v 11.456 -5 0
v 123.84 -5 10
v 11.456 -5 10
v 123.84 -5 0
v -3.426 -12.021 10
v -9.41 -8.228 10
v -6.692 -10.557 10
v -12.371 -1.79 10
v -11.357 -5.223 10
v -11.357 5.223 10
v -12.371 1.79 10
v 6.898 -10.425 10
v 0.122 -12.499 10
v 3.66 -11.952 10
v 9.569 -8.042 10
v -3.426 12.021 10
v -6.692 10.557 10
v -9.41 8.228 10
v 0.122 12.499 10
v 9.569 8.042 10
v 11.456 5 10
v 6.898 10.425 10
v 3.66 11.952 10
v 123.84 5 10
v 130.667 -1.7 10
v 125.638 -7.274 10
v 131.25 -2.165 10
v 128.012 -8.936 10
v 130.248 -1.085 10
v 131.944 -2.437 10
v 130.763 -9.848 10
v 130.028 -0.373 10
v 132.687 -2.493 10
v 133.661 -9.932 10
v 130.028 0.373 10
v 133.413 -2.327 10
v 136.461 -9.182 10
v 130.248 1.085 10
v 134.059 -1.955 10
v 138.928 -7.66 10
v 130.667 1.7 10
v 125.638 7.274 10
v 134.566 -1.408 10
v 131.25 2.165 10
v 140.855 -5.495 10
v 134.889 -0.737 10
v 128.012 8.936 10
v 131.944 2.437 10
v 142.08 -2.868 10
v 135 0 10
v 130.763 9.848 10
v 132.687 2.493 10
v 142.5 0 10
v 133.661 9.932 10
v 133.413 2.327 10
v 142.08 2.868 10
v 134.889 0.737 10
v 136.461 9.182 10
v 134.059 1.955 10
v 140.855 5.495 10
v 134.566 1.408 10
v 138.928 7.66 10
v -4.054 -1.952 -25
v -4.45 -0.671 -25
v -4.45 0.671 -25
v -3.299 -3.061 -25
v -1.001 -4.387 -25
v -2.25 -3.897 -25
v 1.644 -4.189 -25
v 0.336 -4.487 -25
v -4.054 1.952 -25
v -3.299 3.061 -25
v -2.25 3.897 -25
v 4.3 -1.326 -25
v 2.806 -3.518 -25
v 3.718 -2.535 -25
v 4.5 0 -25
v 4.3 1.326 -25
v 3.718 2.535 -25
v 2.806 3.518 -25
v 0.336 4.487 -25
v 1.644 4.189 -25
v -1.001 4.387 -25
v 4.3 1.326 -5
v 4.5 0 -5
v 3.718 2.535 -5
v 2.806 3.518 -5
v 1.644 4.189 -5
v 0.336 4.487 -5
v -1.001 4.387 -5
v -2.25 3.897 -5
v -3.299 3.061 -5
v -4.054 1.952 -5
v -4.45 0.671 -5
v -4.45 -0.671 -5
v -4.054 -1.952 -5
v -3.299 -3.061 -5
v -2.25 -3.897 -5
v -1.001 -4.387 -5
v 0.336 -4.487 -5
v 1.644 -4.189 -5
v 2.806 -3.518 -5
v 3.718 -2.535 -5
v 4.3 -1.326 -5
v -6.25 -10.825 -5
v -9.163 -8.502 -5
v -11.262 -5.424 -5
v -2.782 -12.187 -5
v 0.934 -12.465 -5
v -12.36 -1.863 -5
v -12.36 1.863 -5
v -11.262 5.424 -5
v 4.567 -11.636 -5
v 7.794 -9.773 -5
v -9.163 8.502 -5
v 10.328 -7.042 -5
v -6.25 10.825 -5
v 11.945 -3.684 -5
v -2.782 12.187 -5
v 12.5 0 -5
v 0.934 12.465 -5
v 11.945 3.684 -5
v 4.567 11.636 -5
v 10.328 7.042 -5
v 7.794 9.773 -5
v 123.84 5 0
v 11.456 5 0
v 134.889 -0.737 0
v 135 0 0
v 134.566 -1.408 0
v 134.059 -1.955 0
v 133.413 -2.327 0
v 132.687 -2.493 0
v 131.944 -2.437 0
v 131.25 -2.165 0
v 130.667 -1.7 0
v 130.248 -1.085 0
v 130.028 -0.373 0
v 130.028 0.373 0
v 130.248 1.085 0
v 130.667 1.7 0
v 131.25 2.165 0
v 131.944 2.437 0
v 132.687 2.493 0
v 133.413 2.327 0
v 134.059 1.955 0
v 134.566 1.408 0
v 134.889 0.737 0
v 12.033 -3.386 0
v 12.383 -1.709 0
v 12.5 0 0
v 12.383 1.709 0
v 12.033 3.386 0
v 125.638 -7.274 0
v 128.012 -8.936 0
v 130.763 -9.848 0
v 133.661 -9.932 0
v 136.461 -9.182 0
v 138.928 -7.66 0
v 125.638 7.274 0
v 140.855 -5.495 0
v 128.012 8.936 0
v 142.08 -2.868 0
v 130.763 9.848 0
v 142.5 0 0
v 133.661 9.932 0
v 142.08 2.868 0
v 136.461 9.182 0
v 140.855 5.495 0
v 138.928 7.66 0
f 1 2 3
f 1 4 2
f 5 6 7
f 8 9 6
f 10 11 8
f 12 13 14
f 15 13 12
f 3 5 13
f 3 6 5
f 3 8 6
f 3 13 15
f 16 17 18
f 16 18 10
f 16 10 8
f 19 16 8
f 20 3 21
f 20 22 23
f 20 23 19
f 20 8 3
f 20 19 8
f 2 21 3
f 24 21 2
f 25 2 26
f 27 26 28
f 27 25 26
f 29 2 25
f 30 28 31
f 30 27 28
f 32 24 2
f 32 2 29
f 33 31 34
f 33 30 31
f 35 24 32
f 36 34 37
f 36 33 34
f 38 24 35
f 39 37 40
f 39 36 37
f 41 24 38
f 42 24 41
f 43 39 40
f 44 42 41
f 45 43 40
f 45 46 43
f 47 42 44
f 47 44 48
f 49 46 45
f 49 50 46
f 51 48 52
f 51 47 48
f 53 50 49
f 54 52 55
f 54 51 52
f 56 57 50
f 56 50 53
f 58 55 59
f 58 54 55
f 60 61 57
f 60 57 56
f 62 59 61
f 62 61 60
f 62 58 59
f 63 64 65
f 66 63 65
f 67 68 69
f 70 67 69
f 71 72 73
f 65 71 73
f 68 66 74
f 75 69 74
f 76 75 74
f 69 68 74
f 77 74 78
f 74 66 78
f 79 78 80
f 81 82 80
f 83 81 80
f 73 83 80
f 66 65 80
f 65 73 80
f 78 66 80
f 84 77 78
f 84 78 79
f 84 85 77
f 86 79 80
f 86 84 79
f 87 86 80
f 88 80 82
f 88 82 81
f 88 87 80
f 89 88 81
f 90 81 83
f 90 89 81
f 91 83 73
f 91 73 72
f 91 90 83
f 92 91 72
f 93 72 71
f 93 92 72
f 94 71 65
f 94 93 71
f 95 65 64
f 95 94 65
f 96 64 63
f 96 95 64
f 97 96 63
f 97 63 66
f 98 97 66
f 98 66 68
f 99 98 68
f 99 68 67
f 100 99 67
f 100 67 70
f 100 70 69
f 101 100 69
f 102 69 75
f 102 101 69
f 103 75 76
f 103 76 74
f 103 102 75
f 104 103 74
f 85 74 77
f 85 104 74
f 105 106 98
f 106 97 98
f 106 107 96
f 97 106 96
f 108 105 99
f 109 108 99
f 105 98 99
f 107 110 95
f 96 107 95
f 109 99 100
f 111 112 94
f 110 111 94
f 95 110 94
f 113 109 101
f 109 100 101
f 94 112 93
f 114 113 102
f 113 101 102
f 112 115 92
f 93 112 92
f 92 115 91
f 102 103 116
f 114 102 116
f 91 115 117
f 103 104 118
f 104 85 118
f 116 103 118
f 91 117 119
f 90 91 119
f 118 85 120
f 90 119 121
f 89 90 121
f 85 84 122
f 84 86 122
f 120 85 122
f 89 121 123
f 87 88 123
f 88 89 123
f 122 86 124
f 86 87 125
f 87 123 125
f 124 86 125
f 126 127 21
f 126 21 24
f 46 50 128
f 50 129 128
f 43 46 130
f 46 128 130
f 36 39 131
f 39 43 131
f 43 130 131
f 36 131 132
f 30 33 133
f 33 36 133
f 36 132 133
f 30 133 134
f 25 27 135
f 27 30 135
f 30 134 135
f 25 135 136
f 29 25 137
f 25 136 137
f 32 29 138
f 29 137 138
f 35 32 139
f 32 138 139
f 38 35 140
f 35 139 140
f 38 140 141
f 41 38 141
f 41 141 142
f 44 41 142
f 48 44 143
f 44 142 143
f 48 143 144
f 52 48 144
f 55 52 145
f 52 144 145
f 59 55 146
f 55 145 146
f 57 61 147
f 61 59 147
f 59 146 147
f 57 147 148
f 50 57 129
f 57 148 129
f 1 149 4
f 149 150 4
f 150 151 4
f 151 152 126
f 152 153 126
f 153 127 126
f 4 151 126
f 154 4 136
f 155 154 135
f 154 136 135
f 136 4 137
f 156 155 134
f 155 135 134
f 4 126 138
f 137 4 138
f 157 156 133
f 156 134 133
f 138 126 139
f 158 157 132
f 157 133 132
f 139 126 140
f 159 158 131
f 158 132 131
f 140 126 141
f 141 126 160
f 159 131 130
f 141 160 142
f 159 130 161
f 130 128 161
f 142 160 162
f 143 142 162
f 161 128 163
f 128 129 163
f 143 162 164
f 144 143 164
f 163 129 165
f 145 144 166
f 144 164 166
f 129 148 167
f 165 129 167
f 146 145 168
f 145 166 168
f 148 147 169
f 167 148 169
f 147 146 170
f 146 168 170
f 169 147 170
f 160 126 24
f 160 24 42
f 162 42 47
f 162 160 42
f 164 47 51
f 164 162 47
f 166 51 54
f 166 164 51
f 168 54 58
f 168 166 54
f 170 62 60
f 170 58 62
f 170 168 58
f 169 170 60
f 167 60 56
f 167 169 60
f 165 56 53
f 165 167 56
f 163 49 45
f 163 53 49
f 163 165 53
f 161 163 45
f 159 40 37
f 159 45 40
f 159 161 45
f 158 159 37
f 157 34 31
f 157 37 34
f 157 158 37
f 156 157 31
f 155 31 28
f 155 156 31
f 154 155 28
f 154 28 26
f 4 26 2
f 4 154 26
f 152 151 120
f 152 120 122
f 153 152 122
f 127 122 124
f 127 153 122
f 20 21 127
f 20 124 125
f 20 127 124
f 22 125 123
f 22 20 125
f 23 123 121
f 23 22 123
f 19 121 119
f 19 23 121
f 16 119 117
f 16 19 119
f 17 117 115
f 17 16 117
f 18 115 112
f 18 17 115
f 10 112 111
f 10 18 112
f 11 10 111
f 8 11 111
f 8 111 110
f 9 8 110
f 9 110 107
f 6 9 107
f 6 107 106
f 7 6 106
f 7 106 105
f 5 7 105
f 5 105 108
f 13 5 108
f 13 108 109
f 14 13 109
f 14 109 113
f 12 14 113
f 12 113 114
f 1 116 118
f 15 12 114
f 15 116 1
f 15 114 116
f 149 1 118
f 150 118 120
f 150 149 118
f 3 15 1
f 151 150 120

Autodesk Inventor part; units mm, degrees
ref_plane "YZ Plane" through (0, 0, 0) normal (1, 0, 0) x (0, 1, 0)
ref_plane "XZ Plane" through (0, 0, 0) normal (0, 1, 0) x (-1, 0, 0)
ref_plane "XY Plane" through (0, 0, 0) normal (0, 0, 1) x (1, 0, 0)
sketch "Sketch1" plane through (0, 0, 0) normal (0, 0, 1) x (1, 0, 0)
  circle A0 centre (0, 0) radius 12.5
  circle A1 centre (0, 0) radius 4.5
  arc A2 (123.8397, -5) -> (123.8397, 5) centre (132.5, 0) ccw
  line L0 (11.4564, 5) -> (123.8397, 5)
  line L1 (12.5, -5) -> (123.8397, -5)
  line L2 (12.5, -5) -> (11.4564, -5)
  circle A3 centre (132.5, 0) radius 2.5
  dimension "d0" = 25
  dimension "d1" = 9
  dimension "d3" = 20
  dimension "d6" = 5
extrude "Extrusion1" add sketch "Sketch1" along normal blind 10 contours A0 | A0 L0 A2 L1 L2 | A1
extrude "Extrusion2" add sketch "Sketch1" against normal blind 5 contours A0
extrude "Extrusion3" add sketch "Sketch1" against normal blind 25 contours A1
properties part number "Rod" material "ABS Plastic"
